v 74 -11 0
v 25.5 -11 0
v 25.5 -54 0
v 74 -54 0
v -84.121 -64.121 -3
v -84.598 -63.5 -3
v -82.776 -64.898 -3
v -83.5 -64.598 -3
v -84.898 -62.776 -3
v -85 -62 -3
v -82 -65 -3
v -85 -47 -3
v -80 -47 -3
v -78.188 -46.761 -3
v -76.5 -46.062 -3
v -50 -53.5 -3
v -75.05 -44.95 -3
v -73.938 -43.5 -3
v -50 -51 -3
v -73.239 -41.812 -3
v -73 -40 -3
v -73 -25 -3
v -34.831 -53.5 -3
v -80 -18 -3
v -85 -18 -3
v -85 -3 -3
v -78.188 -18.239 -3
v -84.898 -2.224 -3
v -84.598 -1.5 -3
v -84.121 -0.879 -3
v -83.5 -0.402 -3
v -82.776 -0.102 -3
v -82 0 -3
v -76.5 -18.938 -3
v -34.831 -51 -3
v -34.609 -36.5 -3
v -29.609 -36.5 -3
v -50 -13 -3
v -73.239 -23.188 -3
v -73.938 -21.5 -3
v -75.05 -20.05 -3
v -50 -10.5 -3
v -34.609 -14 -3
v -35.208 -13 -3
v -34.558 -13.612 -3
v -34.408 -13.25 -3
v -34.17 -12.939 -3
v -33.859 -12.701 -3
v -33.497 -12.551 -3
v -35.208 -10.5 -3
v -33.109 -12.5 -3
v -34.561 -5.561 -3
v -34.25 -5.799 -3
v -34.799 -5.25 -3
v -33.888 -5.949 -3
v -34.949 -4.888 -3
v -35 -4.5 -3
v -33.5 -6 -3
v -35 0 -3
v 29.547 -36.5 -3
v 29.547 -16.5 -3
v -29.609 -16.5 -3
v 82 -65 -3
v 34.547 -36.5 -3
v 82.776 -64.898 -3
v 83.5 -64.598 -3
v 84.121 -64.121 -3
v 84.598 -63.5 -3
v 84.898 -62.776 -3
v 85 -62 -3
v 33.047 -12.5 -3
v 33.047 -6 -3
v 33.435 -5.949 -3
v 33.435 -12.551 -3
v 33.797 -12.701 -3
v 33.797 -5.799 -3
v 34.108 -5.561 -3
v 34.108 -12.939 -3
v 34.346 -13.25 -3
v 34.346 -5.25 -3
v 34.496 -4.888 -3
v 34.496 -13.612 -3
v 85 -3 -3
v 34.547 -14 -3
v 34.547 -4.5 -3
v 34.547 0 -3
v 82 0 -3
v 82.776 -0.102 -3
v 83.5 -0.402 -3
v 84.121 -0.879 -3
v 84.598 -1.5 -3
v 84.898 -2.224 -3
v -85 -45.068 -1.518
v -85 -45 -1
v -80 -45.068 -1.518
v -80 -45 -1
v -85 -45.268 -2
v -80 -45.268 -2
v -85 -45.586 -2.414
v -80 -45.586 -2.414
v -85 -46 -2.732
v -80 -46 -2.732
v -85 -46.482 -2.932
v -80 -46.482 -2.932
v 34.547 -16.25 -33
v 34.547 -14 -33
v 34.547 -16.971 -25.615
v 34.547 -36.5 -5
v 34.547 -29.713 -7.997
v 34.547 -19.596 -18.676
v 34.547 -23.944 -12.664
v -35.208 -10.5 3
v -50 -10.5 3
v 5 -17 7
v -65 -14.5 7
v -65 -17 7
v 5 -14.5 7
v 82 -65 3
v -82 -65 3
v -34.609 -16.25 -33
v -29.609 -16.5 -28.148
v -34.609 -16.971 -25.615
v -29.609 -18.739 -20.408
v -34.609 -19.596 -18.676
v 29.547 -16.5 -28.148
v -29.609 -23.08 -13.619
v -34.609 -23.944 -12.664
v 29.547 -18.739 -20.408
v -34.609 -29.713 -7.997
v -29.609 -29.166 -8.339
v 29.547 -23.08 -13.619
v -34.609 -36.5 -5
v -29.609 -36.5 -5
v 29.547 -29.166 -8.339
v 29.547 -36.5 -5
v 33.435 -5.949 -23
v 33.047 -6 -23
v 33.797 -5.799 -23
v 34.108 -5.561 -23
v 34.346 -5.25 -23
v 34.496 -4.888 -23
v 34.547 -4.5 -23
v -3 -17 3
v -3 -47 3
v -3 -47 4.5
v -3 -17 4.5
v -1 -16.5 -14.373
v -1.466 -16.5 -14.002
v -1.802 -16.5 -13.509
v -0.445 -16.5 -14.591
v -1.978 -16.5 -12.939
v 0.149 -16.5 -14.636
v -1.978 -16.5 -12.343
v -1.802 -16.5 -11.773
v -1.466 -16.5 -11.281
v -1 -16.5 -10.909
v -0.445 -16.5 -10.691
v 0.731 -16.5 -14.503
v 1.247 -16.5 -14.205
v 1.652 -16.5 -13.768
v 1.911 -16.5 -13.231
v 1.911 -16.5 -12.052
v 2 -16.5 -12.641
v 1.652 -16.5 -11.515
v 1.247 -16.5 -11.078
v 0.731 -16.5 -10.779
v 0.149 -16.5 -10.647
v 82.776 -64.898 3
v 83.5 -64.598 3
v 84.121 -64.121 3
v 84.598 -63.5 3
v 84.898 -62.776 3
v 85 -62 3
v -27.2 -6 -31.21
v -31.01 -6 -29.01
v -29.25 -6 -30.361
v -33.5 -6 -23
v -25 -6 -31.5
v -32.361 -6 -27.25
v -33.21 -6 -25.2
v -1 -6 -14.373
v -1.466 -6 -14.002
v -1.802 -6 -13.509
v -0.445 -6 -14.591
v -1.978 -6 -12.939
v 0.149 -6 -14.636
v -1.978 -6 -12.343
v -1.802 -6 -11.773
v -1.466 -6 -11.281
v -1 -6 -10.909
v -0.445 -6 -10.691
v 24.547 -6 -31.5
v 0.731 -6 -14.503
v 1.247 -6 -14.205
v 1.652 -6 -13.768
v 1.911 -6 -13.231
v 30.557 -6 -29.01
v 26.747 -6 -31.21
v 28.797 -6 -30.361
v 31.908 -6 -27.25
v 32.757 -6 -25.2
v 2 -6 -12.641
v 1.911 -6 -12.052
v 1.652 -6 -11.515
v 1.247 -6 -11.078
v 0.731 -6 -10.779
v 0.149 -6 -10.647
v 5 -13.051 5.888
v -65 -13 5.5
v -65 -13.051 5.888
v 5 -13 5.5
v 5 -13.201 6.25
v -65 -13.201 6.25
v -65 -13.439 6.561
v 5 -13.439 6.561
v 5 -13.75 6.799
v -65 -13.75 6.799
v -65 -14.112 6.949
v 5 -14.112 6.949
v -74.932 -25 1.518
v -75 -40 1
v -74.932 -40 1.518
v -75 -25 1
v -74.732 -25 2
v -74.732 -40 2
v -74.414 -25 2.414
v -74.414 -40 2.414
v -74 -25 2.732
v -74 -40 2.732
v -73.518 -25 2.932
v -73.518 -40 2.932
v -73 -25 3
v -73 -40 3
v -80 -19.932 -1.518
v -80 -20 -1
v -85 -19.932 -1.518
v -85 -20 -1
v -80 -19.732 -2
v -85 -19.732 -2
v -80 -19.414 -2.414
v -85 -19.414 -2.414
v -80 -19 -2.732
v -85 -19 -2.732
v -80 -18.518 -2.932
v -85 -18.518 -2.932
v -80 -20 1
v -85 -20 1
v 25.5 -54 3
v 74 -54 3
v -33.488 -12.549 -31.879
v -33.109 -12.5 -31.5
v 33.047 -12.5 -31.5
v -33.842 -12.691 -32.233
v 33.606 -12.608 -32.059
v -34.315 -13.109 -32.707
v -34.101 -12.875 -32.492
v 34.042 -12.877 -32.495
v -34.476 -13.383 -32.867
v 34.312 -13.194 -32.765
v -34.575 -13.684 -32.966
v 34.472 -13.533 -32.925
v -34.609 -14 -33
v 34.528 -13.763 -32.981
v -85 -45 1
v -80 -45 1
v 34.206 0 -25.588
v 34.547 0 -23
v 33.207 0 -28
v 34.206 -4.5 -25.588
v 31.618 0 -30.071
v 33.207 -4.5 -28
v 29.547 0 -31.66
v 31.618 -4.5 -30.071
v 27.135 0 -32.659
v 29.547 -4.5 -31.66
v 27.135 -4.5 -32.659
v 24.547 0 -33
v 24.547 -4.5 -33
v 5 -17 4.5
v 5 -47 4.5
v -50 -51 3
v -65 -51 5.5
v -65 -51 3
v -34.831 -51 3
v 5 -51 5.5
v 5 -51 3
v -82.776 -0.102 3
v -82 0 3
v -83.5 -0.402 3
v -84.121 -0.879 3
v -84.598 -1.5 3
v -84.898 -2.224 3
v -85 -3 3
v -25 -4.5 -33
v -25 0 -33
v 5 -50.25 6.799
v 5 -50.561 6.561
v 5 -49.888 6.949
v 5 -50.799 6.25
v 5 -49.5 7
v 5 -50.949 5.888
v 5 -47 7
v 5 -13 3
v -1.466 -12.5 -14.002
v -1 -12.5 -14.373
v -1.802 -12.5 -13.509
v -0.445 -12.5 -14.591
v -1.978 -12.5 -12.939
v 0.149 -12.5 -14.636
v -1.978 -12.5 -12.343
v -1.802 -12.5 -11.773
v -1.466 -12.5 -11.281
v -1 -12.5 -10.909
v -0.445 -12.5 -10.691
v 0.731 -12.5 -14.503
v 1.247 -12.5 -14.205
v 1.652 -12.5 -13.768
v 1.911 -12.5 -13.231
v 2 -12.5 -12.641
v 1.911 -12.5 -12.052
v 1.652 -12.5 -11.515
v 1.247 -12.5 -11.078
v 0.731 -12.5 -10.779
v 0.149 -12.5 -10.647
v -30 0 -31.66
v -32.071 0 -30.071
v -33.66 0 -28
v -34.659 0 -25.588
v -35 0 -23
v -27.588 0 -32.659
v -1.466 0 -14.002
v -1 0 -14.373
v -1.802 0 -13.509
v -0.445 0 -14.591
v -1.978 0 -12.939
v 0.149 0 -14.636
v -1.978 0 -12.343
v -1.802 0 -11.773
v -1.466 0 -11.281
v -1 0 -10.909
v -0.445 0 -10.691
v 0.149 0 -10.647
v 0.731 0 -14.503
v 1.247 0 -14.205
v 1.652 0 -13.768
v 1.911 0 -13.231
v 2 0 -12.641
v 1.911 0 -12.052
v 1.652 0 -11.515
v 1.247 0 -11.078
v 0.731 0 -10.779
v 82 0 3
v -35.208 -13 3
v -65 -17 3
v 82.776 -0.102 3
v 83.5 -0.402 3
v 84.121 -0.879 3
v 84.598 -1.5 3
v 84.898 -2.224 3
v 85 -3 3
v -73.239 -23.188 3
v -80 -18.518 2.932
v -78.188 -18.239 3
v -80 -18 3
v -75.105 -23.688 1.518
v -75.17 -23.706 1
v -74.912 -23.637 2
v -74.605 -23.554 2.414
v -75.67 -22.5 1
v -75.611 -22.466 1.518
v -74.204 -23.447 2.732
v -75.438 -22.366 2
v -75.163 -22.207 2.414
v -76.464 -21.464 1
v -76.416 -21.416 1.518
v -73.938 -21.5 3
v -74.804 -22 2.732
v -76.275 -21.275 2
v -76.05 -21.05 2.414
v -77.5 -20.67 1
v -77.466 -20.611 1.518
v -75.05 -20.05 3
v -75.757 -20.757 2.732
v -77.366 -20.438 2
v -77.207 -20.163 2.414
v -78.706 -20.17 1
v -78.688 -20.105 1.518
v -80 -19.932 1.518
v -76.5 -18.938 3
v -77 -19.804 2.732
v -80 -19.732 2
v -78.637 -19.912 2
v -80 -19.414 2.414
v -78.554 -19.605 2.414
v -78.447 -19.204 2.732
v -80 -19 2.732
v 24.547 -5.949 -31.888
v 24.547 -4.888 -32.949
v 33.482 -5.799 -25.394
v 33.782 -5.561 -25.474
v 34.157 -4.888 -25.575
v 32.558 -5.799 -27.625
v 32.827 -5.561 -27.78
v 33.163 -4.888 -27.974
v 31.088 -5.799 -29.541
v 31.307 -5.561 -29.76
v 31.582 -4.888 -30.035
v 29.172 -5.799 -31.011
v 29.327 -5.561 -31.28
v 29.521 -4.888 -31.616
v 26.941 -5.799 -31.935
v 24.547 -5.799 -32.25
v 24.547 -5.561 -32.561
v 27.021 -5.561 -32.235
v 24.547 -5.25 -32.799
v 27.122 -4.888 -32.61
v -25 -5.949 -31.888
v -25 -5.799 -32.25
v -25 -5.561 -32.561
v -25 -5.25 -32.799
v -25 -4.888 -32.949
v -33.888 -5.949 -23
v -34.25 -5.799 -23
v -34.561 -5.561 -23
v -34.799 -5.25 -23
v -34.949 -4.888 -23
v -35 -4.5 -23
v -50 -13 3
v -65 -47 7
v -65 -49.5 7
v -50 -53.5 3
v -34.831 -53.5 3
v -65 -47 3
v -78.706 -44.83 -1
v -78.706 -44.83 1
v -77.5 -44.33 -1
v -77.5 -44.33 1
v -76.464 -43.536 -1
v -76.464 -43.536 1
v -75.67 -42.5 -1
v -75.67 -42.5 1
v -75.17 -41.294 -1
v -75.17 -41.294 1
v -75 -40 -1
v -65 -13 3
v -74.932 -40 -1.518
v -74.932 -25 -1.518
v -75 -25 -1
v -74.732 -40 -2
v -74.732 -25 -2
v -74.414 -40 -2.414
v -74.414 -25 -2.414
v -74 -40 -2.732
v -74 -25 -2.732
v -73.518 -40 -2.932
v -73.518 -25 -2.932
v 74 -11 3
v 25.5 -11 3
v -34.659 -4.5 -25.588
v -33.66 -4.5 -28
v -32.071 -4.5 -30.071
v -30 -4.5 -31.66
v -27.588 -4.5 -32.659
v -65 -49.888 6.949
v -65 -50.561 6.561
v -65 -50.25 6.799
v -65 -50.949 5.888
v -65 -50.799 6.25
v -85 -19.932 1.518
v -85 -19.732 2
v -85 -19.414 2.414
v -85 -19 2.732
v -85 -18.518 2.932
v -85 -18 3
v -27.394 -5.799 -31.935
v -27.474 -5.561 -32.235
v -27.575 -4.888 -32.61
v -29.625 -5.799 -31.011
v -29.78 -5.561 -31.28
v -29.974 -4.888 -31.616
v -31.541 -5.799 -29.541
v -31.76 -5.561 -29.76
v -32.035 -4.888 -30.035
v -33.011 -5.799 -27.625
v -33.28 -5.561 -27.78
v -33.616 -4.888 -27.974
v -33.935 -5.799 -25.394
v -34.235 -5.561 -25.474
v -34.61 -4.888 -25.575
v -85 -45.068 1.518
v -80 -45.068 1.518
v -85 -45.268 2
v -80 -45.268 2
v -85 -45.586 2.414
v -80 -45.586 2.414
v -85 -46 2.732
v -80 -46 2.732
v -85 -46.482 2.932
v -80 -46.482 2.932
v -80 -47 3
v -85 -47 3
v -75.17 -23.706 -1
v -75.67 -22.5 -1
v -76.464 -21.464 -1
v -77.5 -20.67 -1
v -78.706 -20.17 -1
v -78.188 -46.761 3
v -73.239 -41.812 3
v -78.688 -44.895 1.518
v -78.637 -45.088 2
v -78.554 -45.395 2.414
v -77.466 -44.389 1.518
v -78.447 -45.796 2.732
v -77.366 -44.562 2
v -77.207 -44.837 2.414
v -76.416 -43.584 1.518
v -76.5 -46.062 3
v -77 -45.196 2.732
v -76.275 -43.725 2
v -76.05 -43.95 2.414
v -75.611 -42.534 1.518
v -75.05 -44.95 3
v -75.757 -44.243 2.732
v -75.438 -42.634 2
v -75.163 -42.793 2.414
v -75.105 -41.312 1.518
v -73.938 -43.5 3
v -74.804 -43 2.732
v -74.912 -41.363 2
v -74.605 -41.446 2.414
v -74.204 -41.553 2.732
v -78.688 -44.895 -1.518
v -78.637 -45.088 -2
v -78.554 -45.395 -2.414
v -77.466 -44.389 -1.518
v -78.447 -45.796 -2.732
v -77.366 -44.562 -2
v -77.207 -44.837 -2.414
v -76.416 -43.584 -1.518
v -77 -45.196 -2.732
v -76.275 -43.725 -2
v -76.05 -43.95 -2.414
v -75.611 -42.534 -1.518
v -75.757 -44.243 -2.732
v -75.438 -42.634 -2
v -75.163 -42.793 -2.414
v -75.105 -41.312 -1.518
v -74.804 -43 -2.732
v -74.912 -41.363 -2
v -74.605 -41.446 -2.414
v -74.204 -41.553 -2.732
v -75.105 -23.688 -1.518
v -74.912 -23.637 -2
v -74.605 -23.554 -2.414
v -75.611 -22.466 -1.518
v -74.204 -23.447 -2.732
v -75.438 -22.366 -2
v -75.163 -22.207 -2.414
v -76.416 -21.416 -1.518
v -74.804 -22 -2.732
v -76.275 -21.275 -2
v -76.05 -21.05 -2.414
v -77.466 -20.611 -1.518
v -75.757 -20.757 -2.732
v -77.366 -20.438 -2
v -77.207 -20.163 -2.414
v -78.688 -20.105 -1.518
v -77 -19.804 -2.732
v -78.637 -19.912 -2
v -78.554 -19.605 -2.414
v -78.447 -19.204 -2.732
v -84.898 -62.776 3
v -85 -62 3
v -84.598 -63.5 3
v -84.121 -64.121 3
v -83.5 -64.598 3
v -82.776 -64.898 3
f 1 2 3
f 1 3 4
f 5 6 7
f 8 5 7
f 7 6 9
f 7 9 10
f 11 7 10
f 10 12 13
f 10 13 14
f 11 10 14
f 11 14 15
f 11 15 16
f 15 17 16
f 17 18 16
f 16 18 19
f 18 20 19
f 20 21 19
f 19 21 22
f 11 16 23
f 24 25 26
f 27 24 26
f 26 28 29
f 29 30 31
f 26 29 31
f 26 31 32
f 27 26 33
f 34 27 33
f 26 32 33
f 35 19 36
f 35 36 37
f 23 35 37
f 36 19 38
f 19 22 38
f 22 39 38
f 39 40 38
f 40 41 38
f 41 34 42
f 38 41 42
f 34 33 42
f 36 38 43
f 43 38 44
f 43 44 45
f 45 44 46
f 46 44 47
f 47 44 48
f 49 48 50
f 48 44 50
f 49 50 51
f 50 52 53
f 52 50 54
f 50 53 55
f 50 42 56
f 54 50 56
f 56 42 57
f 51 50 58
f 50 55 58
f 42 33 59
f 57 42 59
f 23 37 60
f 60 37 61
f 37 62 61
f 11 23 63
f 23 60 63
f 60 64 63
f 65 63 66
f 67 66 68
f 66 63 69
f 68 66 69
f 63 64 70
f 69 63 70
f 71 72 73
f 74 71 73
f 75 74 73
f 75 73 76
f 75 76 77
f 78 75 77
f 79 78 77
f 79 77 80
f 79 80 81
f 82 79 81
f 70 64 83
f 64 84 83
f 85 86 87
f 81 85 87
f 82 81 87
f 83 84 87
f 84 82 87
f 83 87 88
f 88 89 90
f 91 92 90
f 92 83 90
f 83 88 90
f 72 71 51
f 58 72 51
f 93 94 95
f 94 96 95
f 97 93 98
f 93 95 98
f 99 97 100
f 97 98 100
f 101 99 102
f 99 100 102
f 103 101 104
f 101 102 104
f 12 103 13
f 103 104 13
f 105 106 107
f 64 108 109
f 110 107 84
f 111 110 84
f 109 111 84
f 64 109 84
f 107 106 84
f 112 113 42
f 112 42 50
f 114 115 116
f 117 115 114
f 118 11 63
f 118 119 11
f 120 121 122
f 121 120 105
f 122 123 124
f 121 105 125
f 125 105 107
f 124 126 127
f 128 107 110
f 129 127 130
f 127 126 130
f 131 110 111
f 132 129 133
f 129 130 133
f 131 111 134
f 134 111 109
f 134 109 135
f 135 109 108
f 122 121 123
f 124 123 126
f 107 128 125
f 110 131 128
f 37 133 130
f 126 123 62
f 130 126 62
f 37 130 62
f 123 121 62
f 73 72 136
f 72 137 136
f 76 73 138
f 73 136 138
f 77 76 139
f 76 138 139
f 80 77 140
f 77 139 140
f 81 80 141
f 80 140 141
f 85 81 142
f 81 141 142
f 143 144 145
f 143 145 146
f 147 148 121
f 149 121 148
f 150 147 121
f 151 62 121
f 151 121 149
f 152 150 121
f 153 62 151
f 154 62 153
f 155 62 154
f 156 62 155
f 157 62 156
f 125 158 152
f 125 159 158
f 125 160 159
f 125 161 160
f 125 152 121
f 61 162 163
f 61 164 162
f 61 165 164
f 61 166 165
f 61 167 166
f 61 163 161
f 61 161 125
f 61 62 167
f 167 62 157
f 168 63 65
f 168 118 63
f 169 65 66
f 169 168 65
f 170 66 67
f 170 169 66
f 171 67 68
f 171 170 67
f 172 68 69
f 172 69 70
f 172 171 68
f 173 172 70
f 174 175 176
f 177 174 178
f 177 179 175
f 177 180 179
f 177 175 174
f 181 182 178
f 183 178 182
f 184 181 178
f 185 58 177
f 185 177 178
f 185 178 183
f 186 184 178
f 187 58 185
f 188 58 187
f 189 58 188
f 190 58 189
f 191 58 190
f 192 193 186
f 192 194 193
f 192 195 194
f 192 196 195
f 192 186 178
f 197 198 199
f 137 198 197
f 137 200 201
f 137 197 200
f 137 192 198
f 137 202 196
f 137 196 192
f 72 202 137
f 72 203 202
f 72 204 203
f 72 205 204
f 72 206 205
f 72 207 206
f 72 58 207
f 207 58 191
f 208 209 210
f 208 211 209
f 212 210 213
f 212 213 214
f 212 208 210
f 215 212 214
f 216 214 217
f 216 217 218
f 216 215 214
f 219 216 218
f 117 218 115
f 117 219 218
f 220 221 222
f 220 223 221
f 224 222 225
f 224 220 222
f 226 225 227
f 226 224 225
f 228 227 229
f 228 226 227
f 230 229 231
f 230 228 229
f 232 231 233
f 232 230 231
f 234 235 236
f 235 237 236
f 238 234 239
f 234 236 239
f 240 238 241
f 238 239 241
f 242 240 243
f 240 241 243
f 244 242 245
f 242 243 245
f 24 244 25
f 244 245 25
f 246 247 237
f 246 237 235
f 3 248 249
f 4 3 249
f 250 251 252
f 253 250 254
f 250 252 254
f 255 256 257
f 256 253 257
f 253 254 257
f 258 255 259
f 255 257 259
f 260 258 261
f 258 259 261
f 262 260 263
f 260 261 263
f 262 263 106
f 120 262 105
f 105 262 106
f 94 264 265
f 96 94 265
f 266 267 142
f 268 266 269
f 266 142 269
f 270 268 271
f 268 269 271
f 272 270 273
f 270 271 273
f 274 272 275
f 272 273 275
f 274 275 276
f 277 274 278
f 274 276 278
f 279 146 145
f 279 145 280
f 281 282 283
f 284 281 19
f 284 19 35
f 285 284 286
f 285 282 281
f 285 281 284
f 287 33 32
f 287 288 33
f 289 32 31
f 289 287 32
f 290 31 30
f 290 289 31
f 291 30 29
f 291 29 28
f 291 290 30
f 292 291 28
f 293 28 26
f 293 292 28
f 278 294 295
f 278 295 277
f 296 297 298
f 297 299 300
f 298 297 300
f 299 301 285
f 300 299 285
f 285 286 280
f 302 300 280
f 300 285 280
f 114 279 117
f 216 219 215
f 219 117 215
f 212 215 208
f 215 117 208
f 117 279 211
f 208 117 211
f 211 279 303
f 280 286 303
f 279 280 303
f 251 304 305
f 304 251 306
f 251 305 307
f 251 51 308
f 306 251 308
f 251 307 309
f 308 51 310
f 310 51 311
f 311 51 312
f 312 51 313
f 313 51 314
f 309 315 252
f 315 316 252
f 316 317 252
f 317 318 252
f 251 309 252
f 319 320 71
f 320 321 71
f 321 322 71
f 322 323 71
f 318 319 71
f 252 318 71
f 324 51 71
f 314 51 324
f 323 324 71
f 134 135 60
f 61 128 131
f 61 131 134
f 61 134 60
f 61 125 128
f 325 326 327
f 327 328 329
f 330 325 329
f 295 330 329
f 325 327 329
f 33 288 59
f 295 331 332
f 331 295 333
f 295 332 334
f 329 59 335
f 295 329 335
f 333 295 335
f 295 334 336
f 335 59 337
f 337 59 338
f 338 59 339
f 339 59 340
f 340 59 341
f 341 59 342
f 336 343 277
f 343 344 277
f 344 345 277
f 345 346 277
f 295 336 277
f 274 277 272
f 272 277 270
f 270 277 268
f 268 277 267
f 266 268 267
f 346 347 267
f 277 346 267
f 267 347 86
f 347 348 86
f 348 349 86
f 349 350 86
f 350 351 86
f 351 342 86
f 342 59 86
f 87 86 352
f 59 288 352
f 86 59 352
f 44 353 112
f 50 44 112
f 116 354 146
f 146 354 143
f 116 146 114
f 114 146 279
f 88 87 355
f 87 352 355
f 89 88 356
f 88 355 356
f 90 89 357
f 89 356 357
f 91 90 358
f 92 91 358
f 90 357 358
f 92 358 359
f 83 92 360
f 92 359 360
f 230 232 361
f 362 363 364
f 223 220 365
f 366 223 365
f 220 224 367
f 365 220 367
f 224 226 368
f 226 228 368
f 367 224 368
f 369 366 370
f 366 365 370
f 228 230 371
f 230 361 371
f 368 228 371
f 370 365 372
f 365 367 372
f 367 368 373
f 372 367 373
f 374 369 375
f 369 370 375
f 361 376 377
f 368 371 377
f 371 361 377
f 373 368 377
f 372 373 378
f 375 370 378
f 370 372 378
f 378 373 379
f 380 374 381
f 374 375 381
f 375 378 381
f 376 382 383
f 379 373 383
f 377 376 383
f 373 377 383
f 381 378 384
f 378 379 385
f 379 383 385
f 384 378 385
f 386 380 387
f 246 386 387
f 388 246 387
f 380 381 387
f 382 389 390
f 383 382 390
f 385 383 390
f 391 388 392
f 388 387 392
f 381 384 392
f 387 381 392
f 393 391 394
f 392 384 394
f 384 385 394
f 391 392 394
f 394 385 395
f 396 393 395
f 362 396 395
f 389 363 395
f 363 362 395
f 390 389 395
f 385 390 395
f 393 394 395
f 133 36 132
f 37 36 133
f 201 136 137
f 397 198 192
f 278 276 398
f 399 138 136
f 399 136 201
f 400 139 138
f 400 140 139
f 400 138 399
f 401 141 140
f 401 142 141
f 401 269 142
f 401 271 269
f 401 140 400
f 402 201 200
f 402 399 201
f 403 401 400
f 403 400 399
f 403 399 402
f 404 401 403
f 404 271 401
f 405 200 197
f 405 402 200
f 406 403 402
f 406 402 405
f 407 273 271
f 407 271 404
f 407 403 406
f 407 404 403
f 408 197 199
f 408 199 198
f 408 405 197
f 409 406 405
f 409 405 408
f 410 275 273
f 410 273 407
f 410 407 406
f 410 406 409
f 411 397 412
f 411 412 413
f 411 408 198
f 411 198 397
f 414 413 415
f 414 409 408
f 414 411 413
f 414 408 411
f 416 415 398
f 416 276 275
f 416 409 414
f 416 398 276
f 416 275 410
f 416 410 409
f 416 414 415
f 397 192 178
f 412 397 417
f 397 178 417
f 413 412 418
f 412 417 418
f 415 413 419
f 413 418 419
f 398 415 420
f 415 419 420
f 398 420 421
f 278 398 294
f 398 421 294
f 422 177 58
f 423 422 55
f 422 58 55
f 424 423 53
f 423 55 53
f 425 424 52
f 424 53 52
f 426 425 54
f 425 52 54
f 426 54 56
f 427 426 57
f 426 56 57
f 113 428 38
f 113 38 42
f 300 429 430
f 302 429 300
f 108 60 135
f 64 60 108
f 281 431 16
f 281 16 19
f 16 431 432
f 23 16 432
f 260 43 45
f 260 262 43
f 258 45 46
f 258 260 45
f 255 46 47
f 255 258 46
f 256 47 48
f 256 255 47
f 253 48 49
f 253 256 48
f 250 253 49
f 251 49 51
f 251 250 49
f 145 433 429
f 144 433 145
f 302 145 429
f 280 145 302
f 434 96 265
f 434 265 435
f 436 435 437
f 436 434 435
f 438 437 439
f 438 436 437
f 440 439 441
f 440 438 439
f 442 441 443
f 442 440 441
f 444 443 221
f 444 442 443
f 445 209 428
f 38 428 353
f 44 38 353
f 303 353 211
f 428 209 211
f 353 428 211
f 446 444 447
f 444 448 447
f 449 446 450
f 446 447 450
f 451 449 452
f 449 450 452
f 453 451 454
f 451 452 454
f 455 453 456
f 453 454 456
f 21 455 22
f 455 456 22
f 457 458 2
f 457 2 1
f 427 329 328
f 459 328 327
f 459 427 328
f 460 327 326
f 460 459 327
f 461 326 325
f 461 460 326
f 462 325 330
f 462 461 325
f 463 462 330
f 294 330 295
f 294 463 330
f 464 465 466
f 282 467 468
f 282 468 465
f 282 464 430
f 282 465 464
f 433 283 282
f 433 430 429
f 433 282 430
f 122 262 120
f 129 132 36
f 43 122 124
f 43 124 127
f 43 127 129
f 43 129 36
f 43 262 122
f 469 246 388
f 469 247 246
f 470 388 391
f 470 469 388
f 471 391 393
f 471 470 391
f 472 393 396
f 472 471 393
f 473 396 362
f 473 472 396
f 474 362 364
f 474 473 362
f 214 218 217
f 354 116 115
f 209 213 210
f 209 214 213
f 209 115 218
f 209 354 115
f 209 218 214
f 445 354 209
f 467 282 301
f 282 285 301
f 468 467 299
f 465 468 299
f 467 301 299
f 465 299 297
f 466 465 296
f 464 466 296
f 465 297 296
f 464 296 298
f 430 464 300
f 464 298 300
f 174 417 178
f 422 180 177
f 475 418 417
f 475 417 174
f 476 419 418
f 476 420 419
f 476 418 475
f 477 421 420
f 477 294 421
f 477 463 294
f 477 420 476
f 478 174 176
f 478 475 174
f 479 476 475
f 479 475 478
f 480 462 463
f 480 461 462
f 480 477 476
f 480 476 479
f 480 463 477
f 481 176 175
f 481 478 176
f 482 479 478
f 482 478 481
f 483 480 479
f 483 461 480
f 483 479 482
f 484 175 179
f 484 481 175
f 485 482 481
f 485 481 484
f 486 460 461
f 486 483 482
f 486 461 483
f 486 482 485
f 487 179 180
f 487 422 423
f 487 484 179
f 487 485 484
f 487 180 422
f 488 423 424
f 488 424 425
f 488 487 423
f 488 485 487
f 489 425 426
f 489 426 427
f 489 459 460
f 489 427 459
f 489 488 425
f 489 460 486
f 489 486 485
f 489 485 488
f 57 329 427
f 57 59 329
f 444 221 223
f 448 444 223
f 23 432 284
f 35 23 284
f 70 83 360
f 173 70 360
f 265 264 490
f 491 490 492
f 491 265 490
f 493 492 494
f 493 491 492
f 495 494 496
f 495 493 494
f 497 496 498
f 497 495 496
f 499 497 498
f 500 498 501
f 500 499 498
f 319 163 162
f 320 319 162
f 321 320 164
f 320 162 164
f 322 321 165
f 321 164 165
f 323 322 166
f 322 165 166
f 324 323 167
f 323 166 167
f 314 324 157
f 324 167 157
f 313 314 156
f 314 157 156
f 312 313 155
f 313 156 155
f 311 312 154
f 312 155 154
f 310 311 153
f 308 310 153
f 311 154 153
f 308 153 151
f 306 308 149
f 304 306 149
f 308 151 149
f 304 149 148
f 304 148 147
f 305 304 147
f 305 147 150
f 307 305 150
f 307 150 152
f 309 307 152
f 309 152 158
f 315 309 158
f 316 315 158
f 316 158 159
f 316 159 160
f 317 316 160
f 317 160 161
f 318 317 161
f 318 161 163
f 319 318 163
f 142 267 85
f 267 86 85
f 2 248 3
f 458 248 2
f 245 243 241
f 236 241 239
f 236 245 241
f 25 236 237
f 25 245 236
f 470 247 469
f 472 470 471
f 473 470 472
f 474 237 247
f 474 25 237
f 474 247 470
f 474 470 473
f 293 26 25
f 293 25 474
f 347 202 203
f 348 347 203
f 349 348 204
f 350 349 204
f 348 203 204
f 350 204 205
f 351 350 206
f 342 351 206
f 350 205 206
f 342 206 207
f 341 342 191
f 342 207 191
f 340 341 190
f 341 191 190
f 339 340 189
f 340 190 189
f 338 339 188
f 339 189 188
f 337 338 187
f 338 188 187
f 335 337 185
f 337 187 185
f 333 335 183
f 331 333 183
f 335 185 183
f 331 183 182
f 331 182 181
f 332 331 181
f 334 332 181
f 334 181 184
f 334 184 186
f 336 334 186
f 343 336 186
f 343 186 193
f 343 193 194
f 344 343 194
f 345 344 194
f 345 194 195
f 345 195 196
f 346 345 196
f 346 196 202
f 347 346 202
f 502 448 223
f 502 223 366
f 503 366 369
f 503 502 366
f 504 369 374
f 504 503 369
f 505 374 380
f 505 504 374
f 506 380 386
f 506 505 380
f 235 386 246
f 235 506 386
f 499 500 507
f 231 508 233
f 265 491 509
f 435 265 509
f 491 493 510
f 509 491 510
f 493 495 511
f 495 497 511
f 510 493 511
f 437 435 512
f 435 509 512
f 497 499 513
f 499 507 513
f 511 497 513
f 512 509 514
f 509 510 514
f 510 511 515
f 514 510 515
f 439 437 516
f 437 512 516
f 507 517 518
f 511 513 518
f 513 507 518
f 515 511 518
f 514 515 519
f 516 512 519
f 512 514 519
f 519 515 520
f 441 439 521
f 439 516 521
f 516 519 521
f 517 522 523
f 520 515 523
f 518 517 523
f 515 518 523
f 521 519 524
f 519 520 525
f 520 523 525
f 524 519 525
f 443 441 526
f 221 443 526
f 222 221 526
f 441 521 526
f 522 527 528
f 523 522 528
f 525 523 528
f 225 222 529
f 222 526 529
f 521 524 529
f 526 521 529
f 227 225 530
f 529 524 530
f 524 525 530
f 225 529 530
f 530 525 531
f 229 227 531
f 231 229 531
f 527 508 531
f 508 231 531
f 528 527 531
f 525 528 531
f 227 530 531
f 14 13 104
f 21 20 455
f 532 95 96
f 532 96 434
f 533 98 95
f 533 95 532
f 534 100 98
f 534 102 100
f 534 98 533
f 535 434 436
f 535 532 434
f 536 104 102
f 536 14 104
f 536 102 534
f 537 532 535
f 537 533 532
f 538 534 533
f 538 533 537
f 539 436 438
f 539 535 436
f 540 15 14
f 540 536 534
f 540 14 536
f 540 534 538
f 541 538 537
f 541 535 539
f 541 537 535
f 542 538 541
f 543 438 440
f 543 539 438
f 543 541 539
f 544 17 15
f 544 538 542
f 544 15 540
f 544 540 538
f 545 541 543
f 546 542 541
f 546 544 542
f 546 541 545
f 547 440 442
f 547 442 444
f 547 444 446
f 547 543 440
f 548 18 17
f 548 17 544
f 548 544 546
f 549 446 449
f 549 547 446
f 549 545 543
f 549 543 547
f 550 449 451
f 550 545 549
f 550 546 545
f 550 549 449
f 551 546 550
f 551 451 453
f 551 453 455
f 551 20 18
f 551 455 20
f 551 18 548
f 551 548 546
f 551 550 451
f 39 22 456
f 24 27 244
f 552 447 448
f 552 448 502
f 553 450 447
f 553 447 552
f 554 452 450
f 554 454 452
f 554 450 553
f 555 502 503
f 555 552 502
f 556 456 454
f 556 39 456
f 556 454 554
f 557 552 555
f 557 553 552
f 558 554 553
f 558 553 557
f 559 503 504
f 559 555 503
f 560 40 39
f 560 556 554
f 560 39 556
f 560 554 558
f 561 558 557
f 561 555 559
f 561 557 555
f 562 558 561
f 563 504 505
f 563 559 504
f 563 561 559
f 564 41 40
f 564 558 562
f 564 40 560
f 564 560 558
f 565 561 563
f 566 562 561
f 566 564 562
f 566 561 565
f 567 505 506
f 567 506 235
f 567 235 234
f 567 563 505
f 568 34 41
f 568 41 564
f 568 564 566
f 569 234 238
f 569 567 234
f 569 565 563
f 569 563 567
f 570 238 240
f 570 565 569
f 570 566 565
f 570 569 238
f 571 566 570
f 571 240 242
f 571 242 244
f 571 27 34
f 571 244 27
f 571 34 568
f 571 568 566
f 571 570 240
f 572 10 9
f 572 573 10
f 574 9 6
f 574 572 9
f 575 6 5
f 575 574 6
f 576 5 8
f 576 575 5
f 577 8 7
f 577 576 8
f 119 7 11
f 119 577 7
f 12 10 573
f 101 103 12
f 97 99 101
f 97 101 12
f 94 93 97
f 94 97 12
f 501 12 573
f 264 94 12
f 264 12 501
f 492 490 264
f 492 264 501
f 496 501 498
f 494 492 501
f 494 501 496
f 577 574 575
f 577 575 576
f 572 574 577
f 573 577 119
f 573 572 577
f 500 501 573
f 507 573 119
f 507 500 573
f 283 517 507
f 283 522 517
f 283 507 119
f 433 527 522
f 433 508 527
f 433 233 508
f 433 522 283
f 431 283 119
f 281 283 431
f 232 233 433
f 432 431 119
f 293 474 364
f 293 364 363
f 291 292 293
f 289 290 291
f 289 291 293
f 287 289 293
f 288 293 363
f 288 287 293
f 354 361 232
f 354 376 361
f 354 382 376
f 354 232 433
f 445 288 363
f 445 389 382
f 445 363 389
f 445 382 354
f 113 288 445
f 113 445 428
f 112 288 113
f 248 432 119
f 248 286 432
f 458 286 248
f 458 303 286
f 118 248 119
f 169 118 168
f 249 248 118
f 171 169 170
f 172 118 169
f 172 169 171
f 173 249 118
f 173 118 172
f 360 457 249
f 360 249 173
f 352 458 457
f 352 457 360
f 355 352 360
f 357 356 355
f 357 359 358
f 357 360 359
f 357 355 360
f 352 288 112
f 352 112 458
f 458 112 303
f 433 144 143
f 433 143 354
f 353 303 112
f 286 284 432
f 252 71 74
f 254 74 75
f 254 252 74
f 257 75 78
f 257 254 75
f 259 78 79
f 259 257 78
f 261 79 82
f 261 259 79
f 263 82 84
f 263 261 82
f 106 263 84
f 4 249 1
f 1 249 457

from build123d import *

# Parameters (mm, degrees)
F0_W        = 170
F0_H        = 6
F1_DEPTH    = 65
F2_W        = 48.5
F2_H        = 43
F3_DEPTH    = 3
F4_W        = 70
F4_H        = 4
F5_DEPTH    = 4
F6_W        = 69.1558677684
F6_H        = 4
F6_W_2      = 69.5469340682
F6_H_2      = 6
F7_DEPTH    = 30
F8_W        = 5
F8_H        = 30
F9_DEPTH    = 20
F10_SIZE2   = 18
F10_SIZE    = 28
F10_2_SIZE2 = 18
F10_2_SIZE  = 28
F11_W       = 14.7919125855
F11_H       = 2.5
F11_W_2     = 15.1694379747
F12_DEPTH   = 36.001
F13_R       = 10
F14_R       = 1.5
F15_R       = 1.5
F16_R       = 3
F18_DEPTH   = 119.5479340682
F20_D       = 4
F21_W       = 10
F21_H       = 25
F22_DEPTH   = 25
F23_R       = 5
F24_R       = 2
F25_R       = 2
F26_R       = 1.5
F27_W       = 8
F27_H       = 30
F28_DEPTH   = 1.5


with BuildPart() as f1:
    # F0 (on Front) → F1 (new body)
    with BuildSketch(Plane.XZ):
        Rectangle(F0_W, F0_H)
    extrude(amount=F1_DEPTH)

    # F2 (on face) → F3 (cut)
    with BuildSketch(Plane.XY.offset(3)):
        with Locations((49.75, -32.5)):
            Rectangle(F2_W, F2_H)
    extrude(amount=-F3_DEPTH, mode=Mode.SUBTRACT)

    # F4 (on face) → F5 (join)
    with BuildSketch(Plane.XY.offset(3)):
        with Locations((-30, -15)):
            Rectangle(F4_W, F4_H)
        with Locations((-30, -49)):
            Rectangle(F4_W, F4_H)
    extrude(amount=F5_DEPTH)

    # F6 (on face) → F7 (join)
    with BuildSketch(Plane(origin=(0, 0, -3), x_dir=(1, 0, 0), z_dir=(0, 0, -1))):
        with Locations((-0.030999816, 14.5)):
            Rectangle(F6_W, F6_H)
        with Locations((-0.2265329659, 3)):
            Rectangle(F6_W_2, F6_H_2)
    extrude(amount=F7_DEPTH)

    # F8 (on face) → F9 (join)
    with BuildSketch(Plane.XZ.offset(16.5)):
        with Locations((-32.1089337002, -18)):
            Rectangle(F8_W, F8_H)
        with Locations((32.0469340682, -18)):
            Rectangle(F8_W, F8_H)
    extrude(amount=F9_DEPTH)

    # F10
    f10_edges = [f1.edges().sort_by_distance(p)[0] for p in [
        (-32.108934, -36.5, -33),
    ]]
    f10_side = f1.faces().sort_by_distance((-32.108934, -36.5, -18))[0]
    chamfer(f10_edges, length=F10_SIZE, length2=F10_SIZE2, reference=f10_side)

    # F10#2
    f10_2_edges = [f1.edges().sort_by_distance(p)[0] for p in [
        (32.046934, -36.5, -33),
    ]]
    f10_2_side = f1.faces().sort_by_distance((32.046934, -36.5, -18))[0]
    chamfer(f10_2_edges, length=F10_2_SIZE, length2=F10_2_SIZE2, reference=f10_2_side)

    # F11 (on face) → F12 (cut, through all)
    with BuildSketch(Plane.XY.offset(3)):
        with Locations((-42.6040437073, -11.75)):
            Rectangle(F11_W, F11_H)
        with Locations((-42.4152810127, -52.25)):
            Rectangle(F11_W_2, F11_H)
    extrude(amount=-F12_DEPTH, mode=Mode.SUBTRACT)

    # F13
    f13_edges = [f1.edges().sort_by_distance(p)[0] for p in [
        (-35, -3, -33),
        (34.546934, -3, -33),
    ]]
    fillet(f13_edges, radius=F13_R)

    # F14
    f14_edges = [f1.edges().sort_by_distance(p)[0] for p in [
        (-34.608934, -12.5, -18),
        (34.546934, -12.5, -18),
        (-0.031, -12.5, -33),
    ]]
    fillet(f14_edges, radius=F14_R)

    # F15
    f15_edges = [f1.edges().sort_by_distance(p)[0] for p in [
        (34.546934, -6, -13),
        (31.618002, -6, -30.071068),
        (-0.226533, -6, -33),
        (-32.071068, -6, -30.071068),
        (-35, -6, -13),
    ]]
    fillet(f15_edges, radius=F15_R)

    # F16
    f16_edges = [f1.edges().sort_by_distance(p)[0] for p in [
        (-85, -65, 0),
        (-85, 0, 0),
        (85, 0, 0),
        (85, -65, 0),
    ]]
    fillet(f16_edges, radius=F16_R)

    # F17 (on face) → F18 (cut, through all)
    with BuildSketch(Plane.YZ.offset(34.5469340682)):
        with BuildLine():
            Line((-18.5, -33), (-16.25, -33))
            ThreePointArc((-16.25, -33), (-21.5712447444, -15.5258555741), (-36.5, -5))
            Line((-36.5, -5), (-18.5, -33))
        make_face()
    extrude(amount=-F18_DEPTH, mode=Mode.SUBTRACT)

    # F20 (through all)
    with Locations(Plane(origin=(0, 0, 0), x_dir=(-1, 0, 0), z_dir=(0, 1, 0))):
        with Locations((0, -12.6412017271)):
            Hole(F20_D / 2)

    # F21 (on face) → F22 (cut)
    with BuildSketch(Plane.XY.offset(3)):
        with Locations((-80, -32.5)):
            Rectangle(F21_W, F21_H)
    extrude(amount=-F22_DEPTH, mode=Mode.SUBTRACT)

    # F23
    f23_edges = [f1.edges().sort_by_distance(p)[0] for p in [
        (-75, -20, 0),
        (-75, -45, 0),
    ]]
    fillet(f23_edges, radius=F23_R)

    # F24
    f24_edges = [f1.edges().sort_by_distance(p)[0] for p in [
        (-75, -32.5, 3),
        (-76.464466, -21.464466, 3),
        (-82.5, -20, 3),
        (-76.464466, -43.535534, 3),
        (-82.5, -45, 3),
    ]]
    fillet(f24_edges, radius=F24_R)

    # F25
    f25_edges = [f1.edges().sort_by_distance(p)[0] for p in [
        (-82.5, -45, -3),
        (-76.464466, -43.535534, -3),
        (-75, -32.5, -3),
        (-76.464466, -21.464466, -3),
        (-82.5, -20, -3),
    ]]
    fillet(f25_edges, radius=F25_R)

    # F26
    f26_edges = [f1.edges().sort_by_distance(p)[0] for p in [
        (-30, -13, 7),
        (-30, -51, 7),
    ]]
    fillet(f26_edges, radius=F26_R)

    # F27 (on face) → F28 (join)
    with BuildSketch(Plane.XY.offset(3)):
        with Locations((1, -32)):
            Rectangle(F27_W, F27_H)
    extrude(amount=F28_DEPTH)


solid = f1.part
